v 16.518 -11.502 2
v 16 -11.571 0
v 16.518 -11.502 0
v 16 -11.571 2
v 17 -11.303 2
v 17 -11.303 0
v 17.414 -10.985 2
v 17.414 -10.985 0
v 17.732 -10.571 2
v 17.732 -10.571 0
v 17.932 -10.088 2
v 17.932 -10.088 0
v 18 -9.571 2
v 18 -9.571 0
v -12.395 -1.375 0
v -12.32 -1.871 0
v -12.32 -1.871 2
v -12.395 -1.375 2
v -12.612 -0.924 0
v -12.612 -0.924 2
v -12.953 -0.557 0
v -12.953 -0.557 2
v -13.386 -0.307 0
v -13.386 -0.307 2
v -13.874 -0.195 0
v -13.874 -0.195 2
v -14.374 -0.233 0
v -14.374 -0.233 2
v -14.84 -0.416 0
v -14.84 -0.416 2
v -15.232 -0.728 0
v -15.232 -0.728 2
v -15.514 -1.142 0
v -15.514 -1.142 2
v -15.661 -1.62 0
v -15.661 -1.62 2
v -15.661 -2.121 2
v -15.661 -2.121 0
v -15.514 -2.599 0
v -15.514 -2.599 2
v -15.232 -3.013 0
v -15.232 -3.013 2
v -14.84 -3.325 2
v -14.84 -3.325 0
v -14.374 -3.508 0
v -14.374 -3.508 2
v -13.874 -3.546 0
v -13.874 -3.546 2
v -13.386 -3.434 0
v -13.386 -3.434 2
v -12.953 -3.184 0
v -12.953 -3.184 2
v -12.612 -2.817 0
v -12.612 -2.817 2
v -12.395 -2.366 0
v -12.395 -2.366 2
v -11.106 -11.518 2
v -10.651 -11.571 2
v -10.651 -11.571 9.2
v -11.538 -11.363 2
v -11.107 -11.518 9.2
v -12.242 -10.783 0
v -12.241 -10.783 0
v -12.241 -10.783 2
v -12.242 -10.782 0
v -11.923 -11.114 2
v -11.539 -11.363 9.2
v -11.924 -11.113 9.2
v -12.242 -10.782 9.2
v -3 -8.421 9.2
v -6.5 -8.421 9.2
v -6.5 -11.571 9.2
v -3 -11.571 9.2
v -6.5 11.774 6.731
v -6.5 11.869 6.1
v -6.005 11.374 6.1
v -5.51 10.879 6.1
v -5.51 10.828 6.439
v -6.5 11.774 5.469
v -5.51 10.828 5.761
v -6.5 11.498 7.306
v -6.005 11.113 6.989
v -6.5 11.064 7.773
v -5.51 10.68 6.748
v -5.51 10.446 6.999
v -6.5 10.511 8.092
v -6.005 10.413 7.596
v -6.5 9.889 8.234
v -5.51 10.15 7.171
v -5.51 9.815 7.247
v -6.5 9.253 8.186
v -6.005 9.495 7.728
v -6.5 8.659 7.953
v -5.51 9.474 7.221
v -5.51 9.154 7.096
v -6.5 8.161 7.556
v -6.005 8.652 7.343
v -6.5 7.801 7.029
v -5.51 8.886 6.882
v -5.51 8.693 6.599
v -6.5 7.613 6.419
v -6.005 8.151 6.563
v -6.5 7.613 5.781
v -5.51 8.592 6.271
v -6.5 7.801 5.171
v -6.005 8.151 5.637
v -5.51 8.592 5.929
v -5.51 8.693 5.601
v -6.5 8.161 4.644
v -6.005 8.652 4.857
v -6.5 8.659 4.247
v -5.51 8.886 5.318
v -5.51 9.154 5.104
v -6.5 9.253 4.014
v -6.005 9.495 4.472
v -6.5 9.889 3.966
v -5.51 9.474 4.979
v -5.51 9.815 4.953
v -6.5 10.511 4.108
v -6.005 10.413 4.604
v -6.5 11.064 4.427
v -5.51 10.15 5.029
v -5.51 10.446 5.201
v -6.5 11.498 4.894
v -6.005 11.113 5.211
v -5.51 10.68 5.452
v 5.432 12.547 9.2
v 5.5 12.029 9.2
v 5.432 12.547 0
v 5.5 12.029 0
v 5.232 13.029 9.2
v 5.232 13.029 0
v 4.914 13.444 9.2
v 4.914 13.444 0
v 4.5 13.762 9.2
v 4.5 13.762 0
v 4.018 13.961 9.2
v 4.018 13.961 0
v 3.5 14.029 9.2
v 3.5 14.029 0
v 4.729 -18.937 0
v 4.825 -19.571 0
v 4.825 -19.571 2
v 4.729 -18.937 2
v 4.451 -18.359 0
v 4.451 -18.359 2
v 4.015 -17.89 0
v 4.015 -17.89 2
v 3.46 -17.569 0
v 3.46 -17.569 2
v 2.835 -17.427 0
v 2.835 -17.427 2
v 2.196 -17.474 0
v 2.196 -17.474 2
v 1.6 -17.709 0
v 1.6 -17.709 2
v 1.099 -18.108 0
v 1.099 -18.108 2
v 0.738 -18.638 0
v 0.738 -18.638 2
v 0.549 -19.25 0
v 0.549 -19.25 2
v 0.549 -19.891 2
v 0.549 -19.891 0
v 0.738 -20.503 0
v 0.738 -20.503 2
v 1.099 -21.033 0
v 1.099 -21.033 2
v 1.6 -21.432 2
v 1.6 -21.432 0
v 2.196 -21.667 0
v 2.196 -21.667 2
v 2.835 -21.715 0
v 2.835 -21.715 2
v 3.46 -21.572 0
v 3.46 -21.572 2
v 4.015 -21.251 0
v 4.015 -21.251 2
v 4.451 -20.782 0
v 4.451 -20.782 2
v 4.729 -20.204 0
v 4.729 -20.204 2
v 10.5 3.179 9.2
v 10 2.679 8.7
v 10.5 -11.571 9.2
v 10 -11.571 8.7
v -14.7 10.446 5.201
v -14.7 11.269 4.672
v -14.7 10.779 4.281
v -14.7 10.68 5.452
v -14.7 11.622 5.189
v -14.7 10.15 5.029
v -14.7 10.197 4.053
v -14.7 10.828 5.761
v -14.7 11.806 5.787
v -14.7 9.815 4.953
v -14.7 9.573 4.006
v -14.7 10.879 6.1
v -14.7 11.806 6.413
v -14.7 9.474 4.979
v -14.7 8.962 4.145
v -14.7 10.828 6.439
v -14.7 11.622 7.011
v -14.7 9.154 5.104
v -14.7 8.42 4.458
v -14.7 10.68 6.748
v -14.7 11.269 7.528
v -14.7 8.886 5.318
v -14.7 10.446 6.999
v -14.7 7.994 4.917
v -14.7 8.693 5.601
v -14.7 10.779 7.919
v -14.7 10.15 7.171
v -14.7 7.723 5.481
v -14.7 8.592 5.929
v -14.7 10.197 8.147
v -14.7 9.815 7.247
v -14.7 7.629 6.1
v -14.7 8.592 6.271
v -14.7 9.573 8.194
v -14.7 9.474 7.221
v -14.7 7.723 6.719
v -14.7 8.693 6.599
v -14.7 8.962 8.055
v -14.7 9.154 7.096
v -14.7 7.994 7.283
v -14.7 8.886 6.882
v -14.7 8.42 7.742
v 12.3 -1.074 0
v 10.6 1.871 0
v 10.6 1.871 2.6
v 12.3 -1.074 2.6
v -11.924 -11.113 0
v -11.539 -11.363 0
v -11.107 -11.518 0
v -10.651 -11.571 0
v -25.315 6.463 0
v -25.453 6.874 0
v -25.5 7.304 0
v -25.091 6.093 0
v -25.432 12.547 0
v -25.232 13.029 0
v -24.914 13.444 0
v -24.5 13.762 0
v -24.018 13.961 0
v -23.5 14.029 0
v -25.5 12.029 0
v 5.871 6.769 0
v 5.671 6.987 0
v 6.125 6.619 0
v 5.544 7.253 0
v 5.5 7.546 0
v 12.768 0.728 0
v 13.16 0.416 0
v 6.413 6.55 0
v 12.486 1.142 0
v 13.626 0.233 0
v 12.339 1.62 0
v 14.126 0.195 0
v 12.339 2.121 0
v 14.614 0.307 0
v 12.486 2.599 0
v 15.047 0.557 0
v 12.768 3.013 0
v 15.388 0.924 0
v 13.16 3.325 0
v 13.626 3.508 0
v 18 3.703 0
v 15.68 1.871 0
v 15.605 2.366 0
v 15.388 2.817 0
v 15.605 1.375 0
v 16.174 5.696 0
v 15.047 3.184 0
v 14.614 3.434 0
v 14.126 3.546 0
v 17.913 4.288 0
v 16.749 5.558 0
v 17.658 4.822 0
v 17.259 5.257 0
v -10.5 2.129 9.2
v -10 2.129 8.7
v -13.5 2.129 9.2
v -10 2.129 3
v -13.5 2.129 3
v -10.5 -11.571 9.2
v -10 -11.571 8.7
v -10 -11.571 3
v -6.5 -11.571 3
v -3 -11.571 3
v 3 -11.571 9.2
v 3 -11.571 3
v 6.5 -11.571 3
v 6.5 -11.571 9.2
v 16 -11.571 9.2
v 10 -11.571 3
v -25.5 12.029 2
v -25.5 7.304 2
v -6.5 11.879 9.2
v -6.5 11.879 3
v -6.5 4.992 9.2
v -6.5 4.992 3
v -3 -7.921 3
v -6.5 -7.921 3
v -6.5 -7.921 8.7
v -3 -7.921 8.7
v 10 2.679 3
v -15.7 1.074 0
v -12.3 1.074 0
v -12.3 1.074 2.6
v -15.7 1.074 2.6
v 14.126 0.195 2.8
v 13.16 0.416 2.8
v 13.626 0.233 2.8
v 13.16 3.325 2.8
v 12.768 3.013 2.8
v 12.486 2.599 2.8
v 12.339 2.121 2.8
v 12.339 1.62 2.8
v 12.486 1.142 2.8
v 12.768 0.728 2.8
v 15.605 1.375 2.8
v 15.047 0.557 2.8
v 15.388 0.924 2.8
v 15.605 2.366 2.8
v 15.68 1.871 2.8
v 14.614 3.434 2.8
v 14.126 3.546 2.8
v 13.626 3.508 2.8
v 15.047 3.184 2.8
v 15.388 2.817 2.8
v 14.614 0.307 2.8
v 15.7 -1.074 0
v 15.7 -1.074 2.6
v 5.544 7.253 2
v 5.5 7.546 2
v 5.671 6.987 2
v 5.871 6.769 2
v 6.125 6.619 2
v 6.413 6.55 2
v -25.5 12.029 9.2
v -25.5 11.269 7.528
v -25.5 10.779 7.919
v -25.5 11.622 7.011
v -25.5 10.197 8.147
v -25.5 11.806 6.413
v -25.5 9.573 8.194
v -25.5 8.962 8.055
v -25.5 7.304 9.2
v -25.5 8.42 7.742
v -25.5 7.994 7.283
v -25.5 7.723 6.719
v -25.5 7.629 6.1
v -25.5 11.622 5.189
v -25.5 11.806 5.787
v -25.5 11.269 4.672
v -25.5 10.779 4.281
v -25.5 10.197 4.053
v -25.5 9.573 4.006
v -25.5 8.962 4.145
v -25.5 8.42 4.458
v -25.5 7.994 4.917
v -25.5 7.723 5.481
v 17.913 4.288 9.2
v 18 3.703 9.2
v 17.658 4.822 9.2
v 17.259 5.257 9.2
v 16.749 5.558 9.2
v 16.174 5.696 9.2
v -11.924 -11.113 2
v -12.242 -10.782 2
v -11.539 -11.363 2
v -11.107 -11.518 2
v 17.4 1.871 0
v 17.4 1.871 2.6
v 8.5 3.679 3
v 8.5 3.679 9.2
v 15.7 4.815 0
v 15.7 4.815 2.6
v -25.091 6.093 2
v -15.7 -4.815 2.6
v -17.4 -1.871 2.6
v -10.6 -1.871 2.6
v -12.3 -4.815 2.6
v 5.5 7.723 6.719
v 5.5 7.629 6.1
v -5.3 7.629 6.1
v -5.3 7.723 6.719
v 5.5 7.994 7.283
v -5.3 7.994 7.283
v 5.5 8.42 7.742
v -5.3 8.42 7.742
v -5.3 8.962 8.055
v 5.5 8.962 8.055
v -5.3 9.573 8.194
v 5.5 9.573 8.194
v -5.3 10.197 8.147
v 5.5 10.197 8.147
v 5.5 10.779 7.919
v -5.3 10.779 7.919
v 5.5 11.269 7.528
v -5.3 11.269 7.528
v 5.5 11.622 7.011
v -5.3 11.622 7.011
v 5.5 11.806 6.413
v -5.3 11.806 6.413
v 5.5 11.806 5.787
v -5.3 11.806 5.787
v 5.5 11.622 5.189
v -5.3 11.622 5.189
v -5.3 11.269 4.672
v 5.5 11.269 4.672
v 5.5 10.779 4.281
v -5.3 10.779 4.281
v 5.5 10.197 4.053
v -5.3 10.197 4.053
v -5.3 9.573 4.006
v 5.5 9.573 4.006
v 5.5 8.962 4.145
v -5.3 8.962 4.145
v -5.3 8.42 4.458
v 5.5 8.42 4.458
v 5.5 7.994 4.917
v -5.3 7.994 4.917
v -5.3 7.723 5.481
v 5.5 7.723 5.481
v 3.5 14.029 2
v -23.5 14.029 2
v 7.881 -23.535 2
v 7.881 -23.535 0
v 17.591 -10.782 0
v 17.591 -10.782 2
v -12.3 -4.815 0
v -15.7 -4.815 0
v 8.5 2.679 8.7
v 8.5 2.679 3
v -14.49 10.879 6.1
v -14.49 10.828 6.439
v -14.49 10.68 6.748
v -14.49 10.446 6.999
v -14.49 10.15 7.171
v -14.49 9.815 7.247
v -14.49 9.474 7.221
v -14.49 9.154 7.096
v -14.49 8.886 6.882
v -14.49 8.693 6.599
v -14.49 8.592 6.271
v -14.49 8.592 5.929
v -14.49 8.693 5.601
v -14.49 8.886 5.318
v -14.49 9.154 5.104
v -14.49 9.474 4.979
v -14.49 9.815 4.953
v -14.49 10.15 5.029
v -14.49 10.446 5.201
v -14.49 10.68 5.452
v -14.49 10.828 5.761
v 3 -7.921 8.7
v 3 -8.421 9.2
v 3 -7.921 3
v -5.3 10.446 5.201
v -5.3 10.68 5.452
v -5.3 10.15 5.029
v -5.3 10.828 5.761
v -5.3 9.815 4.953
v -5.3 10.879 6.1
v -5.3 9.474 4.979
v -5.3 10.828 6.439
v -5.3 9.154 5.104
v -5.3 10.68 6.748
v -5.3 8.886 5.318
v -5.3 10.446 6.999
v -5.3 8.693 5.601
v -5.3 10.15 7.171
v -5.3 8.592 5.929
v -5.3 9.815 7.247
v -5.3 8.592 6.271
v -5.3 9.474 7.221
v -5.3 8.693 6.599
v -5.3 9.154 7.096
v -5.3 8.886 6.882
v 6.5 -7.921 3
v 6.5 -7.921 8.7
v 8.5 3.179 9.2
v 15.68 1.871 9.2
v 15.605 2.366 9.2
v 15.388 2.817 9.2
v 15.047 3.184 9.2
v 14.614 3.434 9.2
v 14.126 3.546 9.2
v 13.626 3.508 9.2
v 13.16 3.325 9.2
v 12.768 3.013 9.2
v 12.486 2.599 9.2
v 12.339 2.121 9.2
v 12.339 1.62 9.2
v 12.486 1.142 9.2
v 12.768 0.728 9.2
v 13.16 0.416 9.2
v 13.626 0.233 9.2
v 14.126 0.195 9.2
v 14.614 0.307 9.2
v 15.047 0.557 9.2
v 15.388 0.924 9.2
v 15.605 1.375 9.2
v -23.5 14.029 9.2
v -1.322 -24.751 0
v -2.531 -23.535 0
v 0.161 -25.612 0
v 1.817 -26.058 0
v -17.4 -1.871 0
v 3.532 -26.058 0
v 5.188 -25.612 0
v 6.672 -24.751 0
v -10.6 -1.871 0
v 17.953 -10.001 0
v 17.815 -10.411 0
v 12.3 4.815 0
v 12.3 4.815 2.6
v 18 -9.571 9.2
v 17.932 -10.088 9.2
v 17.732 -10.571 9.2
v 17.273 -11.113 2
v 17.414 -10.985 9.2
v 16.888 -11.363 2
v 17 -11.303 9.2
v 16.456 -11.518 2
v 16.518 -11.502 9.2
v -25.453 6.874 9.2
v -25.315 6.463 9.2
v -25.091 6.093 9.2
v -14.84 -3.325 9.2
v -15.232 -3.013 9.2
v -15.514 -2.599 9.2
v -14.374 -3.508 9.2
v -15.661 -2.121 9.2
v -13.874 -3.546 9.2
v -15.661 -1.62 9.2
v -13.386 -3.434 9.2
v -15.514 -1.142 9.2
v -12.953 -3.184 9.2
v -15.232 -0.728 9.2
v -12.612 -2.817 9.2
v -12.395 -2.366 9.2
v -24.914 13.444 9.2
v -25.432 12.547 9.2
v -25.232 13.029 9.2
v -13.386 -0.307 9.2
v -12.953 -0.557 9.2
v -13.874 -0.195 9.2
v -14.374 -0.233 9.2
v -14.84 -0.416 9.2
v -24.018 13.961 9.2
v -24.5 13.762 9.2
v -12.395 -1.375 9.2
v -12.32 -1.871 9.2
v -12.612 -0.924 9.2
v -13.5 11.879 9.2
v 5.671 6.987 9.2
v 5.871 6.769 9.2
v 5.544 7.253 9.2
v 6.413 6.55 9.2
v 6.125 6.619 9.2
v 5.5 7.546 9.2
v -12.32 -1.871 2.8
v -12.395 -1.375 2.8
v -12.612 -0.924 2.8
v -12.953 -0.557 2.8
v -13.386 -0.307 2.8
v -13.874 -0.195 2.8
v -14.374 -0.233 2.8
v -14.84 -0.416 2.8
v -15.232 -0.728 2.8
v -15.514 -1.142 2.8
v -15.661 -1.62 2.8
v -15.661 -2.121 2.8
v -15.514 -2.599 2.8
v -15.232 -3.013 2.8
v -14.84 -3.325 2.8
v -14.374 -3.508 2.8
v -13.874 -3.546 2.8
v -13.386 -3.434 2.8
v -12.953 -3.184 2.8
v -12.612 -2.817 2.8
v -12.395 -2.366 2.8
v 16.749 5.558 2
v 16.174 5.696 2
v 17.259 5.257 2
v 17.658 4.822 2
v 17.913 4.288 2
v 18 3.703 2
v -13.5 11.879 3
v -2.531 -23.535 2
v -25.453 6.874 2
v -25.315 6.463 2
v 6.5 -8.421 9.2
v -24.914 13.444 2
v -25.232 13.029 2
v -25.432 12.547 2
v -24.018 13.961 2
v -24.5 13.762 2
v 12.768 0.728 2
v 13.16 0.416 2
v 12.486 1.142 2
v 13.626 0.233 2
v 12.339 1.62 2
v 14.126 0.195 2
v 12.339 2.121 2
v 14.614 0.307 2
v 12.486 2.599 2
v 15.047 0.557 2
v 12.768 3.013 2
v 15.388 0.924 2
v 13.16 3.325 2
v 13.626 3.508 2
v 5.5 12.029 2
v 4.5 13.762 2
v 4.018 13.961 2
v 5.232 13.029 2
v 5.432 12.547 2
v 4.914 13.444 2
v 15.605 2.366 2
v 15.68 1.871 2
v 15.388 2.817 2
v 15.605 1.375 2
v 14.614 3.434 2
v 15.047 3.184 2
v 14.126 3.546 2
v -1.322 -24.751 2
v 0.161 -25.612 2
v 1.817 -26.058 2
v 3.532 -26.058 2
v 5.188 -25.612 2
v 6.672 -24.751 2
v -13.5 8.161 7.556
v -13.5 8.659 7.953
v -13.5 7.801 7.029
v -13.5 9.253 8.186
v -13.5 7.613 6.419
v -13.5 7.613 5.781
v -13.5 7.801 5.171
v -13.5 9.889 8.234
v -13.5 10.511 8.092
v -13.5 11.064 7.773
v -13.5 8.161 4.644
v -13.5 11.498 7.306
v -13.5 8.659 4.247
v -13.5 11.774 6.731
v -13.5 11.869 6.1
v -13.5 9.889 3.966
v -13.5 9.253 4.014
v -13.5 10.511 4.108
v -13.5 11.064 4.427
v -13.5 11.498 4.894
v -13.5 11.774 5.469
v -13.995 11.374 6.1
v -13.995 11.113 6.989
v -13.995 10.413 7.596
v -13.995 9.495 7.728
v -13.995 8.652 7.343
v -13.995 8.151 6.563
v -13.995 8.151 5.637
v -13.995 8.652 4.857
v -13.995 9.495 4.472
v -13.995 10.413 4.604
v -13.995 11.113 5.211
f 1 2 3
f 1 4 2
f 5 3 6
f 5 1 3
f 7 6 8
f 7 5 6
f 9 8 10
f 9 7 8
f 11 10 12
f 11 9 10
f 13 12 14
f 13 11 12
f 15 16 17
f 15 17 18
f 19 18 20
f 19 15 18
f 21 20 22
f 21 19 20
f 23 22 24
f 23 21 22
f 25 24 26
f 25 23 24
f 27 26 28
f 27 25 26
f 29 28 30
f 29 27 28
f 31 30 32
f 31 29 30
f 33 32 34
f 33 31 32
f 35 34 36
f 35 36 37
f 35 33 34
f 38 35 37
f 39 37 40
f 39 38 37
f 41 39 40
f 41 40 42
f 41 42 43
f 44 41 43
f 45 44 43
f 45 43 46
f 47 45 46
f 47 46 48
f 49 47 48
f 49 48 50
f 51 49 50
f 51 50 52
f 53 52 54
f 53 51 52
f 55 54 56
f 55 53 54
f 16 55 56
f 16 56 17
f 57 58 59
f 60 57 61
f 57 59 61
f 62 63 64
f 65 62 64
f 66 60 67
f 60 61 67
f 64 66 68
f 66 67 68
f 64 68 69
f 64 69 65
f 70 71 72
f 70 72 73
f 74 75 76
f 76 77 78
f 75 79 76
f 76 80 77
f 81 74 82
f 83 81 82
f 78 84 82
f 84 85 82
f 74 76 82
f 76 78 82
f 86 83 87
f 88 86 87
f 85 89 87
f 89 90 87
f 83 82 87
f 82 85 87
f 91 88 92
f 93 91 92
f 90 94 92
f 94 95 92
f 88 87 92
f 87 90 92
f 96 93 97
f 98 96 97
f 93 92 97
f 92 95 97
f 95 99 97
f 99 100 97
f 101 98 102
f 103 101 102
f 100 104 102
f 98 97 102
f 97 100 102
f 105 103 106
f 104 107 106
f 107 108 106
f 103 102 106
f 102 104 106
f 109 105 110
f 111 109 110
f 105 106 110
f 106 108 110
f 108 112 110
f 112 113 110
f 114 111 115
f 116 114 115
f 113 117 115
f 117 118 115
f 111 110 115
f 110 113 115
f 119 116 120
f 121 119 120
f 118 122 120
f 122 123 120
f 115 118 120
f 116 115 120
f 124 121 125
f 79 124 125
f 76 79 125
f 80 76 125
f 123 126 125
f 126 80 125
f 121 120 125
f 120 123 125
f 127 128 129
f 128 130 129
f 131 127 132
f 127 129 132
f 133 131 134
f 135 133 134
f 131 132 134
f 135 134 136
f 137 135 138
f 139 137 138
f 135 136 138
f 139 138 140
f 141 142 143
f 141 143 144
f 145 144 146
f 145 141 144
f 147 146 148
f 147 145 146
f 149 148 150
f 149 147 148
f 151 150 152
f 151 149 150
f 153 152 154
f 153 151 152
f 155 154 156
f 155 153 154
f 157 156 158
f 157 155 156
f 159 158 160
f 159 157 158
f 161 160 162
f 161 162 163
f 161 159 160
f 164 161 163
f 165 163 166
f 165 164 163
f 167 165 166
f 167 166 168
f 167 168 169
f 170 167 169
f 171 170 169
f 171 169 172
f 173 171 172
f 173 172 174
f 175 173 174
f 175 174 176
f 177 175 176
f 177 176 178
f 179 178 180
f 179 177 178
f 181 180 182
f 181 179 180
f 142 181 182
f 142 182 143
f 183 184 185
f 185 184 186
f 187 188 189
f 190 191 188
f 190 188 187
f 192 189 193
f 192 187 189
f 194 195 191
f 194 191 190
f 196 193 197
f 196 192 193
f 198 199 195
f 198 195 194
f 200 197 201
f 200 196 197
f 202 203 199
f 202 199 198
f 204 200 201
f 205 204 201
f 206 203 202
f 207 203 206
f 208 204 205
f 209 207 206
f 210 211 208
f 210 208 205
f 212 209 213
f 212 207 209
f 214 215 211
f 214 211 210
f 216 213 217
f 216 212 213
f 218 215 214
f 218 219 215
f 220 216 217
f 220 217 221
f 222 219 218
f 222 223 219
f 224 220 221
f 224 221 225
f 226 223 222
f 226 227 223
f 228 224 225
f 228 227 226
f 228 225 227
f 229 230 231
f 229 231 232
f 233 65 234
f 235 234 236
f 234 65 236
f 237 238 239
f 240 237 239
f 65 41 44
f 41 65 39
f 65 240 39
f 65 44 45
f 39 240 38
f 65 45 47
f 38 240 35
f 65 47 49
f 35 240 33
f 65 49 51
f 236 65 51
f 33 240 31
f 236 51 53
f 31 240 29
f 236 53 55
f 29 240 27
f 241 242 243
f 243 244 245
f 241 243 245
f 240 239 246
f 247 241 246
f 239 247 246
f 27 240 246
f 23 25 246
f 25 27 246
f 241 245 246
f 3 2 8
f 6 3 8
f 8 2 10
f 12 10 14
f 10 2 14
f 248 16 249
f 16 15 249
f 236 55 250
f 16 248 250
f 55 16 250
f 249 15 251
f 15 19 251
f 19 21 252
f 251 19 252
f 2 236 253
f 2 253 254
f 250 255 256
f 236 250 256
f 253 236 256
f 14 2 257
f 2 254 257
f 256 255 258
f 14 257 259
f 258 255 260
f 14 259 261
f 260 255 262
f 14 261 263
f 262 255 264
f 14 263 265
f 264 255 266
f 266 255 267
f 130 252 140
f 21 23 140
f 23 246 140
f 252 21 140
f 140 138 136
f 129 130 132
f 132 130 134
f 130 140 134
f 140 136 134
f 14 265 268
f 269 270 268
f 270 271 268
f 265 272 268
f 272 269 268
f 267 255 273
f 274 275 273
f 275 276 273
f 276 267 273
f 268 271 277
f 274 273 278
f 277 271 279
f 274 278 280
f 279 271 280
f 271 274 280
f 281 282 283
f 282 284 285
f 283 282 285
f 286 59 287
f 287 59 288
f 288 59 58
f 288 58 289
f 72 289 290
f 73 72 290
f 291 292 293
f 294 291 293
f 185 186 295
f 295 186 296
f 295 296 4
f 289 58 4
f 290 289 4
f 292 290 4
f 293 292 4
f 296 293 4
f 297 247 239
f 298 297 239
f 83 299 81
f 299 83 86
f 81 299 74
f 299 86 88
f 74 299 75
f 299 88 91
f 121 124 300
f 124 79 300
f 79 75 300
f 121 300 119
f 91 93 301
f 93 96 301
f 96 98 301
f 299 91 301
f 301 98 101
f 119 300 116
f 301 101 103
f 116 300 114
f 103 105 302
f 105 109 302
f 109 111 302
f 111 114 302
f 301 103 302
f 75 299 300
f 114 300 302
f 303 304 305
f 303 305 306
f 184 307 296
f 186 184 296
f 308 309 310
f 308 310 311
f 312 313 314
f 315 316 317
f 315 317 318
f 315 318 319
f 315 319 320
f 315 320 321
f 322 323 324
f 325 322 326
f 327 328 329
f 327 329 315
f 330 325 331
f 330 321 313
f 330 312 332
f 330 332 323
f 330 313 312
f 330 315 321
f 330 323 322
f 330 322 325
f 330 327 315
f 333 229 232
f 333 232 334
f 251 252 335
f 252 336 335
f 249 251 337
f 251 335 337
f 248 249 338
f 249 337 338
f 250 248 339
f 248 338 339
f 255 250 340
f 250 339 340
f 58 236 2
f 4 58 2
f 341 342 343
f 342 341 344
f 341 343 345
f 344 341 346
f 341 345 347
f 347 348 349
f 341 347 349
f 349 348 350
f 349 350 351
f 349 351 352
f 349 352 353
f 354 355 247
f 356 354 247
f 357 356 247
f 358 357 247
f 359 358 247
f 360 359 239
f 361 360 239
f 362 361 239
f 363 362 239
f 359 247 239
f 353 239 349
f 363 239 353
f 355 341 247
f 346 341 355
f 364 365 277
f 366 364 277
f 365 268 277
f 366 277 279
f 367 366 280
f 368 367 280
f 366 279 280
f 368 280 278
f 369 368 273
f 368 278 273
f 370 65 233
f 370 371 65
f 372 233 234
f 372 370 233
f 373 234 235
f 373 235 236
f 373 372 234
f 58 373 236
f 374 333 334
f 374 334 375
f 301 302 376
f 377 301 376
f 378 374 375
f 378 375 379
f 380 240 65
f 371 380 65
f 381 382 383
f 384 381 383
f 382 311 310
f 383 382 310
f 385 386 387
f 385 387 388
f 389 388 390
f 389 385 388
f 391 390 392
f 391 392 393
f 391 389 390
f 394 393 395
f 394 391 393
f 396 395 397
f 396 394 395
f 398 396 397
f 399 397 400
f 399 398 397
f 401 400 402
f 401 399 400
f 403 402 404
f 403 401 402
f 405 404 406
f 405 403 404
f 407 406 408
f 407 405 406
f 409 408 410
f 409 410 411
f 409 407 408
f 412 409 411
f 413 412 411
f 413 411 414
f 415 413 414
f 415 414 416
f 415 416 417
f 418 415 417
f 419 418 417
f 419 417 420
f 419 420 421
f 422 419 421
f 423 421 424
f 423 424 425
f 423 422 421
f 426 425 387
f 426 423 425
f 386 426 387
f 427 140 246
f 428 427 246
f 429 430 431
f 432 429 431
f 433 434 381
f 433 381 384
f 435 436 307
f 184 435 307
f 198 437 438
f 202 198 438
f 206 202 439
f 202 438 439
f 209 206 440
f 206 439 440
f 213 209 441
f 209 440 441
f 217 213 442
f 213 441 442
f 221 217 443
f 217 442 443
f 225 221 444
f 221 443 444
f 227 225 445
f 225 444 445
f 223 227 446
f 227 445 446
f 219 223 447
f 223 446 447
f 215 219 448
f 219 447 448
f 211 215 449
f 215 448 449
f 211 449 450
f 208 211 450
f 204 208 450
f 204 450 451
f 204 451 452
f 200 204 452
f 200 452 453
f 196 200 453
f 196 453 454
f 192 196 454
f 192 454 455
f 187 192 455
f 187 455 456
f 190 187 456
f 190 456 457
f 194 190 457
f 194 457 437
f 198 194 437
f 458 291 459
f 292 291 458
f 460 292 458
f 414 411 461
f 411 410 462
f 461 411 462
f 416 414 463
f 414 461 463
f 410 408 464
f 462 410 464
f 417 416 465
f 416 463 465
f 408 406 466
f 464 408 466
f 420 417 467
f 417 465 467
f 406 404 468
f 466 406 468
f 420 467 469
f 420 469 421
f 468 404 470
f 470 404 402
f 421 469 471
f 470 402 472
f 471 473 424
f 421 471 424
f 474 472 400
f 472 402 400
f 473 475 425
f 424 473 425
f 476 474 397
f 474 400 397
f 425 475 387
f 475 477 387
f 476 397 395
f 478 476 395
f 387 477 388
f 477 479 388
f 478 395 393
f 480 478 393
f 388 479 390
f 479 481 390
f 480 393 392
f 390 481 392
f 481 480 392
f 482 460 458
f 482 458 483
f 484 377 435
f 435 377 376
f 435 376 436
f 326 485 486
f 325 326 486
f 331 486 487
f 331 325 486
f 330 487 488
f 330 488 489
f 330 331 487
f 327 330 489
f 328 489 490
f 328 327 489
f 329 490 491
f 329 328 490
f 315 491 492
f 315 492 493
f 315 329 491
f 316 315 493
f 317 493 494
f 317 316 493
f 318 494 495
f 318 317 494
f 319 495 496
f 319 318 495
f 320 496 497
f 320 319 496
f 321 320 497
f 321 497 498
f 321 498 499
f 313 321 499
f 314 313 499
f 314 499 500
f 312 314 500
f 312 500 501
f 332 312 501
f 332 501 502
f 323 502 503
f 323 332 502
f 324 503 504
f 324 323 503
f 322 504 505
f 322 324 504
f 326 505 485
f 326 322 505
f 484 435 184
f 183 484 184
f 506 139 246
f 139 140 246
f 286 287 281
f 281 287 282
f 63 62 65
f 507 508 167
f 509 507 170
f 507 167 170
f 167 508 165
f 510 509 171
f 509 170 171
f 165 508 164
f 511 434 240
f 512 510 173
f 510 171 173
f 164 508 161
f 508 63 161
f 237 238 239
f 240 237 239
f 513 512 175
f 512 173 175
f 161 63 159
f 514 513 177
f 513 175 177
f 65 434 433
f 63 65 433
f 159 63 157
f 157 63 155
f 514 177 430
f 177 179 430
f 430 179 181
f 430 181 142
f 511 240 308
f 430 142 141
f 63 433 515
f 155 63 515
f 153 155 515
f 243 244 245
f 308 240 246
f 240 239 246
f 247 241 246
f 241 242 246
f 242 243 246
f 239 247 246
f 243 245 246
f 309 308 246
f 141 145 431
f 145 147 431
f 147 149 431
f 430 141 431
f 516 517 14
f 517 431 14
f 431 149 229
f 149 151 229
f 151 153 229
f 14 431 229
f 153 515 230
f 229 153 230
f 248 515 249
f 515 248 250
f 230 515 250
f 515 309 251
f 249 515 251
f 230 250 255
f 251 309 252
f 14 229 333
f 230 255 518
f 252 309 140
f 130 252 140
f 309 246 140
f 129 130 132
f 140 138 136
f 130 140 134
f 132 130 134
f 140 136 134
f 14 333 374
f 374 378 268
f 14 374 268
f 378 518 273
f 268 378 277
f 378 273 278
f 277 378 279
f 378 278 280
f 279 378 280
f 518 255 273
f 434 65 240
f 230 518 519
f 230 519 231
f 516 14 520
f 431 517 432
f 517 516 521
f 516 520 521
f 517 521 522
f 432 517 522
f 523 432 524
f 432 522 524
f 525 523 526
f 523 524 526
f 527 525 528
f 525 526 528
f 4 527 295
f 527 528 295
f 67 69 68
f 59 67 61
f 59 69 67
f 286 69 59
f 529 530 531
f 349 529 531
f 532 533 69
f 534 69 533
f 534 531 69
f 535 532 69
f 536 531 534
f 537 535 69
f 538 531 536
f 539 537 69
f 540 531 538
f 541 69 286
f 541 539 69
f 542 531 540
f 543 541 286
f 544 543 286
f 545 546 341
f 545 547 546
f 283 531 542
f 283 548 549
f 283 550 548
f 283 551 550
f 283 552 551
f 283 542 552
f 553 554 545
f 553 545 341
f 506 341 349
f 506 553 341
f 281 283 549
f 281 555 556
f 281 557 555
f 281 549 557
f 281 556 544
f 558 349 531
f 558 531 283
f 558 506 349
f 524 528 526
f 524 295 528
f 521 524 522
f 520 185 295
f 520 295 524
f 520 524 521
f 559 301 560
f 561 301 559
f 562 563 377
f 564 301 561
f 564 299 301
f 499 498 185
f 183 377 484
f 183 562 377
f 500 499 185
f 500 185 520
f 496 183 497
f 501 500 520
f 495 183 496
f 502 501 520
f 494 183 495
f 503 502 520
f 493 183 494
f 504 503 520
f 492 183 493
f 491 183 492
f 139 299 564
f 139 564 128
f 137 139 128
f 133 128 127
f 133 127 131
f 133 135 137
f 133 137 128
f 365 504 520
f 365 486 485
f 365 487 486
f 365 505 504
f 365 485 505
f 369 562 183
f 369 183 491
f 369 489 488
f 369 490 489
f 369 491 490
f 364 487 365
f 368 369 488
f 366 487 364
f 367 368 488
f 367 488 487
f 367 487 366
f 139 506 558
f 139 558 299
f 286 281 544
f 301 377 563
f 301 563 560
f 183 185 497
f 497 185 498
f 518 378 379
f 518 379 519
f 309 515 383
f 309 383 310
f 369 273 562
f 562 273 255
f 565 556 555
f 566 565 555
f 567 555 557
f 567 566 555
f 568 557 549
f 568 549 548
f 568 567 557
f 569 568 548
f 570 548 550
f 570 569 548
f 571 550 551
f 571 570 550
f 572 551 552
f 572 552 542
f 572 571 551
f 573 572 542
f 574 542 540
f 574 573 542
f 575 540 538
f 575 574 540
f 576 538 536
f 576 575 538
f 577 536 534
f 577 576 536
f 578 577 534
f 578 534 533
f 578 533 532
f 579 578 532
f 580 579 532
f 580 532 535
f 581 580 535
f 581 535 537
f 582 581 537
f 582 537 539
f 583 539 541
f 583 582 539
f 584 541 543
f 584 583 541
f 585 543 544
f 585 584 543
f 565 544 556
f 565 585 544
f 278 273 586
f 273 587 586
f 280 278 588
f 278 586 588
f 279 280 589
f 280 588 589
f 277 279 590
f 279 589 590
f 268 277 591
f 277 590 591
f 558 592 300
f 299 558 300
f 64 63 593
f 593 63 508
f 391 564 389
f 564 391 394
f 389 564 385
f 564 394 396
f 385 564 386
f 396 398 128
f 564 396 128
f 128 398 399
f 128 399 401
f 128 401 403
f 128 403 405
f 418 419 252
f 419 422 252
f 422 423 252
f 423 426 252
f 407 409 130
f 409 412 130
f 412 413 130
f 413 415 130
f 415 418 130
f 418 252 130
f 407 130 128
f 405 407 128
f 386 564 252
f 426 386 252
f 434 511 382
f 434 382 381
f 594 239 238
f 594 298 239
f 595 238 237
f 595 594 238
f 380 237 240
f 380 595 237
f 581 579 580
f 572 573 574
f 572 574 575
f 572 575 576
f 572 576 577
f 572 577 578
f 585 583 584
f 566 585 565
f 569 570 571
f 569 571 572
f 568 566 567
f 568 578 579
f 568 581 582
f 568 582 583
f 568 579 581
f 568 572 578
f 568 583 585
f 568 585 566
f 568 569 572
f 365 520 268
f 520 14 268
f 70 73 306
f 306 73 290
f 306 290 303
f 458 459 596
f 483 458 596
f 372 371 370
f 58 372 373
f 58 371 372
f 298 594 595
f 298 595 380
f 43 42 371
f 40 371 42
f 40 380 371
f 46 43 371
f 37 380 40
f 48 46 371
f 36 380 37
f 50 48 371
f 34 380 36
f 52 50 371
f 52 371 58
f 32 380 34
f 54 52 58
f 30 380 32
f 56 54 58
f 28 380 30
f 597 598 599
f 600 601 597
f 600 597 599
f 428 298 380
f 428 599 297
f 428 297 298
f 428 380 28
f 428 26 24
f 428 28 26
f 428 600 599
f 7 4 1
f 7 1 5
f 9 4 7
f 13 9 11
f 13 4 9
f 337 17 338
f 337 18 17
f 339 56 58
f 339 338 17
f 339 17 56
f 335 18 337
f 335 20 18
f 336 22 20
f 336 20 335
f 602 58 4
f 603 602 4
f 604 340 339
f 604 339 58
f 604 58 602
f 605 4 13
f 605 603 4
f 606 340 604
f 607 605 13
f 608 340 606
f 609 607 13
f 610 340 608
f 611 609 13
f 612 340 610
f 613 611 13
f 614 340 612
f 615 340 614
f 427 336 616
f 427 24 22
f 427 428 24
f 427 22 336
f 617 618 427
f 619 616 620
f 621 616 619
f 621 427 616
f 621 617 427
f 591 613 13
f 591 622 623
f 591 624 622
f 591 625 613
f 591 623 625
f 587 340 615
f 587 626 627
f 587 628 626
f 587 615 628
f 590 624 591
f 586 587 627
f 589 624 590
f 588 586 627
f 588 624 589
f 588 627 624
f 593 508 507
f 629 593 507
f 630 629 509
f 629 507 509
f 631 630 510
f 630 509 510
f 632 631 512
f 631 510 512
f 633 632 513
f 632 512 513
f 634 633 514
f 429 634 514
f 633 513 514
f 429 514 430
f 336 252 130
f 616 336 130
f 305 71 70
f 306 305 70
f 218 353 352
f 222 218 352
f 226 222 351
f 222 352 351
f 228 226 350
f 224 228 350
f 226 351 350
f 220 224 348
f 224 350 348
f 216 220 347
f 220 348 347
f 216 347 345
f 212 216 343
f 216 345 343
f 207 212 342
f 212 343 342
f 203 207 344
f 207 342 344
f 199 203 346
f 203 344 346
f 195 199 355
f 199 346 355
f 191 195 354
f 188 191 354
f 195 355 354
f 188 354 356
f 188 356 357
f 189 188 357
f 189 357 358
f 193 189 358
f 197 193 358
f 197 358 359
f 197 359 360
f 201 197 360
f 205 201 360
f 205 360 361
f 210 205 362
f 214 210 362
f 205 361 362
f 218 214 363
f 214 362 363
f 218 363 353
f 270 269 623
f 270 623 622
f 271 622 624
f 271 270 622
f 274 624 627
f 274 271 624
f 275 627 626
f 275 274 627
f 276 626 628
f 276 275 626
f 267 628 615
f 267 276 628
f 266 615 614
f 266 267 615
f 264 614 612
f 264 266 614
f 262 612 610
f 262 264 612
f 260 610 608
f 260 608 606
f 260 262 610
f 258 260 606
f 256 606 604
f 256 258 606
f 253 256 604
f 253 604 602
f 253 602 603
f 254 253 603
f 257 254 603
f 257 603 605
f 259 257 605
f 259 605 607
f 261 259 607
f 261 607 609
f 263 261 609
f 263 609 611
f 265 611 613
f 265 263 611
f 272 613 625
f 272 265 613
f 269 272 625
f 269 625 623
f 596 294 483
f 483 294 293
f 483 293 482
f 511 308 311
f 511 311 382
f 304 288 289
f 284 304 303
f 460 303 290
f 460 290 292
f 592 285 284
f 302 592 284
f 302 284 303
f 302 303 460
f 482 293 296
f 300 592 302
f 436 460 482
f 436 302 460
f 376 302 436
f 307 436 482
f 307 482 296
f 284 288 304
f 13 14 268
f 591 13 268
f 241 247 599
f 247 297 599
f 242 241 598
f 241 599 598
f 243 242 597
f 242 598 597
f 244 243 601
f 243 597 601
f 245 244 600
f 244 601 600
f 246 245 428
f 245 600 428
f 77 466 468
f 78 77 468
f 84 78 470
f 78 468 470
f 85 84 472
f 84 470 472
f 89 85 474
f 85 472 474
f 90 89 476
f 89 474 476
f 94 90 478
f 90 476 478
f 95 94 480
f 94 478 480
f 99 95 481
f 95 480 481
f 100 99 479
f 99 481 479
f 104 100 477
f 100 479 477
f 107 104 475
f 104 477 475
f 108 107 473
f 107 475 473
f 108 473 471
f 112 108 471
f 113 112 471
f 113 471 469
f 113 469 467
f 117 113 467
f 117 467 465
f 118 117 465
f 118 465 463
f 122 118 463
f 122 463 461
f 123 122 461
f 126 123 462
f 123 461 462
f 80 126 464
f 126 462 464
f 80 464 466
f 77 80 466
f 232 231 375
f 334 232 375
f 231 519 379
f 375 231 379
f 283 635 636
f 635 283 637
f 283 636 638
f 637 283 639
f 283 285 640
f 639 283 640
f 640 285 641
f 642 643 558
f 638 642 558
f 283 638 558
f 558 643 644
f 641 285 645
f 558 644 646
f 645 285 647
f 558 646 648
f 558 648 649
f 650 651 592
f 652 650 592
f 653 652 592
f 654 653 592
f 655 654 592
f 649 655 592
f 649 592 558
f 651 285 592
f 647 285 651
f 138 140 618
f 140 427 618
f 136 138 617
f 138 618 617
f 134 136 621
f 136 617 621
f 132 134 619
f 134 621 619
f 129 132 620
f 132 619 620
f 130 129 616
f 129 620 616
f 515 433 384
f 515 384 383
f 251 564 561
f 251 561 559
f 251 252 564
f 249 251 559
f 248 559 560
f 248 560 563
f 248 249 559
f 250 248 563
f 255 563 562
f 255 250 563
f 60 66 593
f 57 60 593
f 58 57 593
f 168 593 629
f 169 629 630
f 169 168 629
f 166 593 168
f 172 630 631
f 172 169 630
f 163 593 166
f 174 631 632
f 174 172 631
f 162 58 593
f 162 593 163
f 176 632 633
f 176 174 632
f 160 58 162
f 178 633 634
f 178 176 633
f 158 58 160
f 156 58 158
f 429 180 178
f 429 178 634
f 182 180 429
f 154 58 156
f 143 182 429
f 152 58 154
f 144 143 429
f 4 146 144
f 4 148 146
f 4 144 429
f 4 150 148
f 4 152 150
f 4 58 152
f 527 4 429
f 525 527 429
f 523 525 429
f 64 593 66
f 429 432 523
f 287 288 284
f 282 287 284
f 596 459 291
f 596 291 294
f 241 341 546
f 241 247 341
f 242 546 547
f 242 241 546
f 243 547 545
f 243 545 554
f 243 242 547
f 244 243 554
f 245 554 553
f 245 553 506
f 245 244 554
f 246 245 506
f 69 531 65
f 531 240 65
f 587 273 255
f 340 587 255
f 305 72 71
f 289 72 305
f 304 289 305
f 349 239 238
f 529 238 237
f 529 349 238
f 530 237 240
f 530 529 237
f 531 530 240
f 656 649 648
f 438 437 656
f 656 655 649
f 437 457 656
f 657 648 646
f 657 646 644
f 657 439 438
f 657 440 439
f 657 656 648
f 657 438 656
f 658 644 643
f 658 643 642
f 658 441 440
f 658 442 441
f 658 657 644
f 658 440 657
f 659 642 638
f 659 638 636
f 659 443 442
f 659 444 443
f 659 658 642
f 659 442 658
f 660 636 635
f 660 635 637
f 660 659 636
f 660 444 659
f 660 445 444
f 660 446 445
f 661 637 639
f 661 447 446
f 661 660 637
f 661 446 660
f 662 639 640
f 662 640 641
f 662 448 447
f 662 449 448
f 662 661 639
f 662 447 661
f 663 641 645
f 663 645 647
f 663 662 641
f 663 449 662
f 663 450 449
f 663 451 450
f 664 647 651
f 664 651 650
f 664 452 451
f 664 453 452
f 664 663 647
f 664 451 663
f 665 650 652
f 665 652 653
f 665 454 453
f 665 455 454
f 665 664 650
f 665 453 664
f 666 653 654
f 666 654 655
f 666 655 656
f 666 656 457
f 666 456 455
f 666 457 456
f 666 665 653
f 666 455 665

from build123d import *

# Parameters (mm, degrees)
SKETCH007_R       = 1.68
PAD002_DEPTH      = 2
FILLET002_R       = 2
FILLET003_R       = 1
PAD_DEPTH         = 3
POCKET003_DEPTH   = 2.6
SKETCH009_R       = 1.68
POCKET004_DEPTH   = 0.2
SKETCH004_R       = 1.68
SKETCH004_W       = 3.5
SKETCH004_H       = 3.65
PAD001_DEPTH      = 6.2
FILLET_R          = 2
FILLET001_R       = 1
SKETCH003_R       = 1.15
POCKET_DEPTH      = 25.501
POCKET_DEPTH_BACK = 18.001
CHAMFER_SIZE      = 0.99
SKETCH005_R       = 2.1
POCKET001_DEPTH   = 10.8
SKETCH006_R       = 2.1
POCKET002_DEPTH   = 10.8
CHAMFER001_SIZE   = 0.5
SKETCH010_R       = 2.15
PAD003_DEPTH      = 2


with BuildPart() as lid:
    # Sketch007 → Pad002 (new body)
    with BuildSketch(Plane.XY):
        Polygon((-25.5, 14.029466), (-25.5, 6.629466), (-11.641508, -11.570534), (18, -11.570534), (18, 5.535858), (5.5, 6.629466), (5.5, 14.029466), align=None)
        with Locations((-14, -1.870534)):
            Circle(SKETCH007_R, mode=Mode.SUBTRACT)
        with Locations((14, 1.870534)):
            Circle(SKETCH007_R, mode=Mode.SUBTRACT)
    extrude(amount=PAD002_DEPTH)

    # Fillet002
    fillet002_edges = [lid.edges().sort_by_distance(p)[0] for p in [
        (-25.5, 14.029466, 1),
        (5.5, 14.029466, 1),
        (18, 5.535858, 1),
        (18, -11.570534, 1),
        (-11.641508, -11.570534, 1),
        (-25.5, 6.629466, 1),
    ]]
    fillet(fillet002_edges, radius=FILLET002_R)

    # Fillet003
    fillet003_edges = [lid.edges().sort_by_distance(p)[0] for p in [
        (5.5, 6.629466, 1),
    ]]
    fillet(fillet003_edges, radius=FILLET003_R)


with BuildPart() as fixswitchbay:
    # Sketch001 → Pad (new body)
    with BuildSketch(Plane.XY):
        Polygon((-25.5, 14.029466), (-25.5, 6.629466), (-11.641508, -11.570534), (18, -11.570534), (18, 5.535858), (5.5, 6.629466), (5.5, 14.029466), align=None)
    extrude(amount=PAD_DEPTH)

    # Sketch008 → Pocket003 (cut)
    with BuildSketch(Plane.XY):
        Polygon((10.6, 1.870534), (12.3, -1.073953), (15.7, -1.073953), (17.4, 1.870534), (15.7, 4.81502), (12.3, 4.81502), align=None)
        Polygon((-12.3, 1.073953), (-15.7, 1.073953), (-17.4, -1.870534), (-15.7, -4.81502), (-12.3, -4.81502), (-10.6, -1.870534), align=None)
    extrude(amount=POCKET003_DEPTH, mode=Mode.SUBTRACT)

    # Sketch009 → Pocket004 (cut)
    with BuildSketch(Plane.XY.offset(3)):
        with Locations((14, 1.870534)):
            Circle(SKETCH009_R)
        with Locations((-14, -1.870534)):
            Circle(SKETCH009_R)
    extrude(amount=-POCKET004_DEPTH, mode=Mode.SUBTRACT)

    # Sketch004 → Pad001 (join)
    with BuildSketch(Plane.XY.offset(3)):
        Polygon((-25.5, 14.029466), (-25.5, 6.629466), (-11.641508, -11.570534), (-10, -11.570534), (-10, 2.129466), (-13.5, 2.129466), (-13.5, 11.879466), (-6.5, 11.879466), (-6.5, 4.991796), (8.5, 3.679466), (8.5, 2.679466), (10, 2.679466), (10, -11.570534), (18, -11.570534), (18, 5.535858), (5.5, 6.629466), (5.5, 14.029466), align=None)
        with Locations((-14, -1.870534)):
            Circle(SKETCH004_R, mode=Mode.SUBTRACT)
        with Locations((14, 1.870534)):
            Circle(SKETCH004_R, mode=Mode.SUBTRACT)
        with Locations((-4.75, -9.745534)):
            Rectangle(SKETCH004_W, SKETCH004_H)
        with Locations((4.75, -9.745534)):
            Rectangle(SKETCH004_W, SKETCH004_H)
    extrude(amount=PAD001_DEPTH)

    # Fillet
    fillet_edges = [fixswitchbay.edges().sort_by_distance(p)[0] for p in [
        (-25.5, 6.629466, 4.6),
        (-25.5, 14.029466, 4.6),
        (-11.641508, -11.570534, 4.6),
        (18, -11.570534, 4.6),
        (5.5, 14.029466, 4.6),
        (18, 5.535858, 4.6),
    ]]
    fillet(fillet_edges, radius=FILLET_R)

    # Fillet001
    fillet001_edges = [fixswitchbay.edges().sort_by_distance(p)[0] for p in [
        (5.5, 6.629466, 4.6),
    ]]
    fillet(fillet001_edges, radius=FILLET001_R)

    # Sketch003 → Pocket (cut, two sides)
    with BuildSketch(Plane.YZ) as pocket_sk:
        with Locations((9.729466, 6.1)):
            Circle(SKETCH003_R)
    extrude(amount=-POCKET_DEPTH, mode=Mode.SUBTRACT)
    extrude(pocket_sk.sketch, amount=POCKET_DEPTH_BACK, mode=Mode.SUBTRACT)

    # Chamfer
    chamfer_edges = [fixswitchbay.edges().sort_by_distance(p)[0] for p in [
        (-6.5, 8.579466, 6.1),
        (-13.5, 8.579466, 6.1),
    ]]
    chamfer(chamfer_edges, length=CHAMFER_SIZE)

    # Sketch005 (on DatumPlane) → Pocket001 (cut)
    with BuildSketch(Plane(origin=(5.5, 9.729466, 0), x_dir=(0, -1, 0), z_dir=(-1, 0, 0))):
        with Locations((0, 6.1)):
            Circle(SKETCH005_R)
    extrude(amount=POCKET001_DEPTH, mode=Mode.SUBTRACT)

    # Sketch006 (on DatumPlane) → Pocket002 (cut)
    with BuildSketch(Plane(origin=(-25.5, 9.729466, 0), x_dir=(0, -1, 0), z_dir=(-1, 0, 0))):
        with Locations((0, 6.1)):
            Circle(SKETCH006_R)
    extrude(amount=-POCKET002_DEPTH, mode=Mode.SUBTRACT)

    # Chamfer001
    chamfer001_edges = [fixswitchbay.edges().sort_by_distance(p)[0] for p in [
        (-10, -4.720534, 9.2),
        (10, -4.445534, 9.2),
        (9.25, 2.679466, 9.2),
        (4.75, -7.920534, 9.2),
        (-4.75, -7.920534, 9.2),
    ]]
    chamfer(chamfer001_edges, length=CHAMFER001_SIZE)

    # Sketch010 → Pad003 (new body)
    with BuildSketch(Plane.XY):
        with BuildLine():
            Line((-12.241813, -10.782168), (-2.531331, -23.534693))
            ThreePointArc((-2.531331, -23.534693), (2.674697, -26.114026), (7.880726, -23.534693))
            Line((7.880726, -23.534693), (17.591208, -10.782168))
            Line((-12.241813, -10.782168), (17.591208, -10.782168))
        make_face()
        with Locations((2.674697, -19.570534)):
            Circle(SKETCH010_R, mode=Mode.SUBTRACT)
    extrude(amount=PAD003_DEPTH)


solid = Compound([lid.part, fixswitchbay.part])
